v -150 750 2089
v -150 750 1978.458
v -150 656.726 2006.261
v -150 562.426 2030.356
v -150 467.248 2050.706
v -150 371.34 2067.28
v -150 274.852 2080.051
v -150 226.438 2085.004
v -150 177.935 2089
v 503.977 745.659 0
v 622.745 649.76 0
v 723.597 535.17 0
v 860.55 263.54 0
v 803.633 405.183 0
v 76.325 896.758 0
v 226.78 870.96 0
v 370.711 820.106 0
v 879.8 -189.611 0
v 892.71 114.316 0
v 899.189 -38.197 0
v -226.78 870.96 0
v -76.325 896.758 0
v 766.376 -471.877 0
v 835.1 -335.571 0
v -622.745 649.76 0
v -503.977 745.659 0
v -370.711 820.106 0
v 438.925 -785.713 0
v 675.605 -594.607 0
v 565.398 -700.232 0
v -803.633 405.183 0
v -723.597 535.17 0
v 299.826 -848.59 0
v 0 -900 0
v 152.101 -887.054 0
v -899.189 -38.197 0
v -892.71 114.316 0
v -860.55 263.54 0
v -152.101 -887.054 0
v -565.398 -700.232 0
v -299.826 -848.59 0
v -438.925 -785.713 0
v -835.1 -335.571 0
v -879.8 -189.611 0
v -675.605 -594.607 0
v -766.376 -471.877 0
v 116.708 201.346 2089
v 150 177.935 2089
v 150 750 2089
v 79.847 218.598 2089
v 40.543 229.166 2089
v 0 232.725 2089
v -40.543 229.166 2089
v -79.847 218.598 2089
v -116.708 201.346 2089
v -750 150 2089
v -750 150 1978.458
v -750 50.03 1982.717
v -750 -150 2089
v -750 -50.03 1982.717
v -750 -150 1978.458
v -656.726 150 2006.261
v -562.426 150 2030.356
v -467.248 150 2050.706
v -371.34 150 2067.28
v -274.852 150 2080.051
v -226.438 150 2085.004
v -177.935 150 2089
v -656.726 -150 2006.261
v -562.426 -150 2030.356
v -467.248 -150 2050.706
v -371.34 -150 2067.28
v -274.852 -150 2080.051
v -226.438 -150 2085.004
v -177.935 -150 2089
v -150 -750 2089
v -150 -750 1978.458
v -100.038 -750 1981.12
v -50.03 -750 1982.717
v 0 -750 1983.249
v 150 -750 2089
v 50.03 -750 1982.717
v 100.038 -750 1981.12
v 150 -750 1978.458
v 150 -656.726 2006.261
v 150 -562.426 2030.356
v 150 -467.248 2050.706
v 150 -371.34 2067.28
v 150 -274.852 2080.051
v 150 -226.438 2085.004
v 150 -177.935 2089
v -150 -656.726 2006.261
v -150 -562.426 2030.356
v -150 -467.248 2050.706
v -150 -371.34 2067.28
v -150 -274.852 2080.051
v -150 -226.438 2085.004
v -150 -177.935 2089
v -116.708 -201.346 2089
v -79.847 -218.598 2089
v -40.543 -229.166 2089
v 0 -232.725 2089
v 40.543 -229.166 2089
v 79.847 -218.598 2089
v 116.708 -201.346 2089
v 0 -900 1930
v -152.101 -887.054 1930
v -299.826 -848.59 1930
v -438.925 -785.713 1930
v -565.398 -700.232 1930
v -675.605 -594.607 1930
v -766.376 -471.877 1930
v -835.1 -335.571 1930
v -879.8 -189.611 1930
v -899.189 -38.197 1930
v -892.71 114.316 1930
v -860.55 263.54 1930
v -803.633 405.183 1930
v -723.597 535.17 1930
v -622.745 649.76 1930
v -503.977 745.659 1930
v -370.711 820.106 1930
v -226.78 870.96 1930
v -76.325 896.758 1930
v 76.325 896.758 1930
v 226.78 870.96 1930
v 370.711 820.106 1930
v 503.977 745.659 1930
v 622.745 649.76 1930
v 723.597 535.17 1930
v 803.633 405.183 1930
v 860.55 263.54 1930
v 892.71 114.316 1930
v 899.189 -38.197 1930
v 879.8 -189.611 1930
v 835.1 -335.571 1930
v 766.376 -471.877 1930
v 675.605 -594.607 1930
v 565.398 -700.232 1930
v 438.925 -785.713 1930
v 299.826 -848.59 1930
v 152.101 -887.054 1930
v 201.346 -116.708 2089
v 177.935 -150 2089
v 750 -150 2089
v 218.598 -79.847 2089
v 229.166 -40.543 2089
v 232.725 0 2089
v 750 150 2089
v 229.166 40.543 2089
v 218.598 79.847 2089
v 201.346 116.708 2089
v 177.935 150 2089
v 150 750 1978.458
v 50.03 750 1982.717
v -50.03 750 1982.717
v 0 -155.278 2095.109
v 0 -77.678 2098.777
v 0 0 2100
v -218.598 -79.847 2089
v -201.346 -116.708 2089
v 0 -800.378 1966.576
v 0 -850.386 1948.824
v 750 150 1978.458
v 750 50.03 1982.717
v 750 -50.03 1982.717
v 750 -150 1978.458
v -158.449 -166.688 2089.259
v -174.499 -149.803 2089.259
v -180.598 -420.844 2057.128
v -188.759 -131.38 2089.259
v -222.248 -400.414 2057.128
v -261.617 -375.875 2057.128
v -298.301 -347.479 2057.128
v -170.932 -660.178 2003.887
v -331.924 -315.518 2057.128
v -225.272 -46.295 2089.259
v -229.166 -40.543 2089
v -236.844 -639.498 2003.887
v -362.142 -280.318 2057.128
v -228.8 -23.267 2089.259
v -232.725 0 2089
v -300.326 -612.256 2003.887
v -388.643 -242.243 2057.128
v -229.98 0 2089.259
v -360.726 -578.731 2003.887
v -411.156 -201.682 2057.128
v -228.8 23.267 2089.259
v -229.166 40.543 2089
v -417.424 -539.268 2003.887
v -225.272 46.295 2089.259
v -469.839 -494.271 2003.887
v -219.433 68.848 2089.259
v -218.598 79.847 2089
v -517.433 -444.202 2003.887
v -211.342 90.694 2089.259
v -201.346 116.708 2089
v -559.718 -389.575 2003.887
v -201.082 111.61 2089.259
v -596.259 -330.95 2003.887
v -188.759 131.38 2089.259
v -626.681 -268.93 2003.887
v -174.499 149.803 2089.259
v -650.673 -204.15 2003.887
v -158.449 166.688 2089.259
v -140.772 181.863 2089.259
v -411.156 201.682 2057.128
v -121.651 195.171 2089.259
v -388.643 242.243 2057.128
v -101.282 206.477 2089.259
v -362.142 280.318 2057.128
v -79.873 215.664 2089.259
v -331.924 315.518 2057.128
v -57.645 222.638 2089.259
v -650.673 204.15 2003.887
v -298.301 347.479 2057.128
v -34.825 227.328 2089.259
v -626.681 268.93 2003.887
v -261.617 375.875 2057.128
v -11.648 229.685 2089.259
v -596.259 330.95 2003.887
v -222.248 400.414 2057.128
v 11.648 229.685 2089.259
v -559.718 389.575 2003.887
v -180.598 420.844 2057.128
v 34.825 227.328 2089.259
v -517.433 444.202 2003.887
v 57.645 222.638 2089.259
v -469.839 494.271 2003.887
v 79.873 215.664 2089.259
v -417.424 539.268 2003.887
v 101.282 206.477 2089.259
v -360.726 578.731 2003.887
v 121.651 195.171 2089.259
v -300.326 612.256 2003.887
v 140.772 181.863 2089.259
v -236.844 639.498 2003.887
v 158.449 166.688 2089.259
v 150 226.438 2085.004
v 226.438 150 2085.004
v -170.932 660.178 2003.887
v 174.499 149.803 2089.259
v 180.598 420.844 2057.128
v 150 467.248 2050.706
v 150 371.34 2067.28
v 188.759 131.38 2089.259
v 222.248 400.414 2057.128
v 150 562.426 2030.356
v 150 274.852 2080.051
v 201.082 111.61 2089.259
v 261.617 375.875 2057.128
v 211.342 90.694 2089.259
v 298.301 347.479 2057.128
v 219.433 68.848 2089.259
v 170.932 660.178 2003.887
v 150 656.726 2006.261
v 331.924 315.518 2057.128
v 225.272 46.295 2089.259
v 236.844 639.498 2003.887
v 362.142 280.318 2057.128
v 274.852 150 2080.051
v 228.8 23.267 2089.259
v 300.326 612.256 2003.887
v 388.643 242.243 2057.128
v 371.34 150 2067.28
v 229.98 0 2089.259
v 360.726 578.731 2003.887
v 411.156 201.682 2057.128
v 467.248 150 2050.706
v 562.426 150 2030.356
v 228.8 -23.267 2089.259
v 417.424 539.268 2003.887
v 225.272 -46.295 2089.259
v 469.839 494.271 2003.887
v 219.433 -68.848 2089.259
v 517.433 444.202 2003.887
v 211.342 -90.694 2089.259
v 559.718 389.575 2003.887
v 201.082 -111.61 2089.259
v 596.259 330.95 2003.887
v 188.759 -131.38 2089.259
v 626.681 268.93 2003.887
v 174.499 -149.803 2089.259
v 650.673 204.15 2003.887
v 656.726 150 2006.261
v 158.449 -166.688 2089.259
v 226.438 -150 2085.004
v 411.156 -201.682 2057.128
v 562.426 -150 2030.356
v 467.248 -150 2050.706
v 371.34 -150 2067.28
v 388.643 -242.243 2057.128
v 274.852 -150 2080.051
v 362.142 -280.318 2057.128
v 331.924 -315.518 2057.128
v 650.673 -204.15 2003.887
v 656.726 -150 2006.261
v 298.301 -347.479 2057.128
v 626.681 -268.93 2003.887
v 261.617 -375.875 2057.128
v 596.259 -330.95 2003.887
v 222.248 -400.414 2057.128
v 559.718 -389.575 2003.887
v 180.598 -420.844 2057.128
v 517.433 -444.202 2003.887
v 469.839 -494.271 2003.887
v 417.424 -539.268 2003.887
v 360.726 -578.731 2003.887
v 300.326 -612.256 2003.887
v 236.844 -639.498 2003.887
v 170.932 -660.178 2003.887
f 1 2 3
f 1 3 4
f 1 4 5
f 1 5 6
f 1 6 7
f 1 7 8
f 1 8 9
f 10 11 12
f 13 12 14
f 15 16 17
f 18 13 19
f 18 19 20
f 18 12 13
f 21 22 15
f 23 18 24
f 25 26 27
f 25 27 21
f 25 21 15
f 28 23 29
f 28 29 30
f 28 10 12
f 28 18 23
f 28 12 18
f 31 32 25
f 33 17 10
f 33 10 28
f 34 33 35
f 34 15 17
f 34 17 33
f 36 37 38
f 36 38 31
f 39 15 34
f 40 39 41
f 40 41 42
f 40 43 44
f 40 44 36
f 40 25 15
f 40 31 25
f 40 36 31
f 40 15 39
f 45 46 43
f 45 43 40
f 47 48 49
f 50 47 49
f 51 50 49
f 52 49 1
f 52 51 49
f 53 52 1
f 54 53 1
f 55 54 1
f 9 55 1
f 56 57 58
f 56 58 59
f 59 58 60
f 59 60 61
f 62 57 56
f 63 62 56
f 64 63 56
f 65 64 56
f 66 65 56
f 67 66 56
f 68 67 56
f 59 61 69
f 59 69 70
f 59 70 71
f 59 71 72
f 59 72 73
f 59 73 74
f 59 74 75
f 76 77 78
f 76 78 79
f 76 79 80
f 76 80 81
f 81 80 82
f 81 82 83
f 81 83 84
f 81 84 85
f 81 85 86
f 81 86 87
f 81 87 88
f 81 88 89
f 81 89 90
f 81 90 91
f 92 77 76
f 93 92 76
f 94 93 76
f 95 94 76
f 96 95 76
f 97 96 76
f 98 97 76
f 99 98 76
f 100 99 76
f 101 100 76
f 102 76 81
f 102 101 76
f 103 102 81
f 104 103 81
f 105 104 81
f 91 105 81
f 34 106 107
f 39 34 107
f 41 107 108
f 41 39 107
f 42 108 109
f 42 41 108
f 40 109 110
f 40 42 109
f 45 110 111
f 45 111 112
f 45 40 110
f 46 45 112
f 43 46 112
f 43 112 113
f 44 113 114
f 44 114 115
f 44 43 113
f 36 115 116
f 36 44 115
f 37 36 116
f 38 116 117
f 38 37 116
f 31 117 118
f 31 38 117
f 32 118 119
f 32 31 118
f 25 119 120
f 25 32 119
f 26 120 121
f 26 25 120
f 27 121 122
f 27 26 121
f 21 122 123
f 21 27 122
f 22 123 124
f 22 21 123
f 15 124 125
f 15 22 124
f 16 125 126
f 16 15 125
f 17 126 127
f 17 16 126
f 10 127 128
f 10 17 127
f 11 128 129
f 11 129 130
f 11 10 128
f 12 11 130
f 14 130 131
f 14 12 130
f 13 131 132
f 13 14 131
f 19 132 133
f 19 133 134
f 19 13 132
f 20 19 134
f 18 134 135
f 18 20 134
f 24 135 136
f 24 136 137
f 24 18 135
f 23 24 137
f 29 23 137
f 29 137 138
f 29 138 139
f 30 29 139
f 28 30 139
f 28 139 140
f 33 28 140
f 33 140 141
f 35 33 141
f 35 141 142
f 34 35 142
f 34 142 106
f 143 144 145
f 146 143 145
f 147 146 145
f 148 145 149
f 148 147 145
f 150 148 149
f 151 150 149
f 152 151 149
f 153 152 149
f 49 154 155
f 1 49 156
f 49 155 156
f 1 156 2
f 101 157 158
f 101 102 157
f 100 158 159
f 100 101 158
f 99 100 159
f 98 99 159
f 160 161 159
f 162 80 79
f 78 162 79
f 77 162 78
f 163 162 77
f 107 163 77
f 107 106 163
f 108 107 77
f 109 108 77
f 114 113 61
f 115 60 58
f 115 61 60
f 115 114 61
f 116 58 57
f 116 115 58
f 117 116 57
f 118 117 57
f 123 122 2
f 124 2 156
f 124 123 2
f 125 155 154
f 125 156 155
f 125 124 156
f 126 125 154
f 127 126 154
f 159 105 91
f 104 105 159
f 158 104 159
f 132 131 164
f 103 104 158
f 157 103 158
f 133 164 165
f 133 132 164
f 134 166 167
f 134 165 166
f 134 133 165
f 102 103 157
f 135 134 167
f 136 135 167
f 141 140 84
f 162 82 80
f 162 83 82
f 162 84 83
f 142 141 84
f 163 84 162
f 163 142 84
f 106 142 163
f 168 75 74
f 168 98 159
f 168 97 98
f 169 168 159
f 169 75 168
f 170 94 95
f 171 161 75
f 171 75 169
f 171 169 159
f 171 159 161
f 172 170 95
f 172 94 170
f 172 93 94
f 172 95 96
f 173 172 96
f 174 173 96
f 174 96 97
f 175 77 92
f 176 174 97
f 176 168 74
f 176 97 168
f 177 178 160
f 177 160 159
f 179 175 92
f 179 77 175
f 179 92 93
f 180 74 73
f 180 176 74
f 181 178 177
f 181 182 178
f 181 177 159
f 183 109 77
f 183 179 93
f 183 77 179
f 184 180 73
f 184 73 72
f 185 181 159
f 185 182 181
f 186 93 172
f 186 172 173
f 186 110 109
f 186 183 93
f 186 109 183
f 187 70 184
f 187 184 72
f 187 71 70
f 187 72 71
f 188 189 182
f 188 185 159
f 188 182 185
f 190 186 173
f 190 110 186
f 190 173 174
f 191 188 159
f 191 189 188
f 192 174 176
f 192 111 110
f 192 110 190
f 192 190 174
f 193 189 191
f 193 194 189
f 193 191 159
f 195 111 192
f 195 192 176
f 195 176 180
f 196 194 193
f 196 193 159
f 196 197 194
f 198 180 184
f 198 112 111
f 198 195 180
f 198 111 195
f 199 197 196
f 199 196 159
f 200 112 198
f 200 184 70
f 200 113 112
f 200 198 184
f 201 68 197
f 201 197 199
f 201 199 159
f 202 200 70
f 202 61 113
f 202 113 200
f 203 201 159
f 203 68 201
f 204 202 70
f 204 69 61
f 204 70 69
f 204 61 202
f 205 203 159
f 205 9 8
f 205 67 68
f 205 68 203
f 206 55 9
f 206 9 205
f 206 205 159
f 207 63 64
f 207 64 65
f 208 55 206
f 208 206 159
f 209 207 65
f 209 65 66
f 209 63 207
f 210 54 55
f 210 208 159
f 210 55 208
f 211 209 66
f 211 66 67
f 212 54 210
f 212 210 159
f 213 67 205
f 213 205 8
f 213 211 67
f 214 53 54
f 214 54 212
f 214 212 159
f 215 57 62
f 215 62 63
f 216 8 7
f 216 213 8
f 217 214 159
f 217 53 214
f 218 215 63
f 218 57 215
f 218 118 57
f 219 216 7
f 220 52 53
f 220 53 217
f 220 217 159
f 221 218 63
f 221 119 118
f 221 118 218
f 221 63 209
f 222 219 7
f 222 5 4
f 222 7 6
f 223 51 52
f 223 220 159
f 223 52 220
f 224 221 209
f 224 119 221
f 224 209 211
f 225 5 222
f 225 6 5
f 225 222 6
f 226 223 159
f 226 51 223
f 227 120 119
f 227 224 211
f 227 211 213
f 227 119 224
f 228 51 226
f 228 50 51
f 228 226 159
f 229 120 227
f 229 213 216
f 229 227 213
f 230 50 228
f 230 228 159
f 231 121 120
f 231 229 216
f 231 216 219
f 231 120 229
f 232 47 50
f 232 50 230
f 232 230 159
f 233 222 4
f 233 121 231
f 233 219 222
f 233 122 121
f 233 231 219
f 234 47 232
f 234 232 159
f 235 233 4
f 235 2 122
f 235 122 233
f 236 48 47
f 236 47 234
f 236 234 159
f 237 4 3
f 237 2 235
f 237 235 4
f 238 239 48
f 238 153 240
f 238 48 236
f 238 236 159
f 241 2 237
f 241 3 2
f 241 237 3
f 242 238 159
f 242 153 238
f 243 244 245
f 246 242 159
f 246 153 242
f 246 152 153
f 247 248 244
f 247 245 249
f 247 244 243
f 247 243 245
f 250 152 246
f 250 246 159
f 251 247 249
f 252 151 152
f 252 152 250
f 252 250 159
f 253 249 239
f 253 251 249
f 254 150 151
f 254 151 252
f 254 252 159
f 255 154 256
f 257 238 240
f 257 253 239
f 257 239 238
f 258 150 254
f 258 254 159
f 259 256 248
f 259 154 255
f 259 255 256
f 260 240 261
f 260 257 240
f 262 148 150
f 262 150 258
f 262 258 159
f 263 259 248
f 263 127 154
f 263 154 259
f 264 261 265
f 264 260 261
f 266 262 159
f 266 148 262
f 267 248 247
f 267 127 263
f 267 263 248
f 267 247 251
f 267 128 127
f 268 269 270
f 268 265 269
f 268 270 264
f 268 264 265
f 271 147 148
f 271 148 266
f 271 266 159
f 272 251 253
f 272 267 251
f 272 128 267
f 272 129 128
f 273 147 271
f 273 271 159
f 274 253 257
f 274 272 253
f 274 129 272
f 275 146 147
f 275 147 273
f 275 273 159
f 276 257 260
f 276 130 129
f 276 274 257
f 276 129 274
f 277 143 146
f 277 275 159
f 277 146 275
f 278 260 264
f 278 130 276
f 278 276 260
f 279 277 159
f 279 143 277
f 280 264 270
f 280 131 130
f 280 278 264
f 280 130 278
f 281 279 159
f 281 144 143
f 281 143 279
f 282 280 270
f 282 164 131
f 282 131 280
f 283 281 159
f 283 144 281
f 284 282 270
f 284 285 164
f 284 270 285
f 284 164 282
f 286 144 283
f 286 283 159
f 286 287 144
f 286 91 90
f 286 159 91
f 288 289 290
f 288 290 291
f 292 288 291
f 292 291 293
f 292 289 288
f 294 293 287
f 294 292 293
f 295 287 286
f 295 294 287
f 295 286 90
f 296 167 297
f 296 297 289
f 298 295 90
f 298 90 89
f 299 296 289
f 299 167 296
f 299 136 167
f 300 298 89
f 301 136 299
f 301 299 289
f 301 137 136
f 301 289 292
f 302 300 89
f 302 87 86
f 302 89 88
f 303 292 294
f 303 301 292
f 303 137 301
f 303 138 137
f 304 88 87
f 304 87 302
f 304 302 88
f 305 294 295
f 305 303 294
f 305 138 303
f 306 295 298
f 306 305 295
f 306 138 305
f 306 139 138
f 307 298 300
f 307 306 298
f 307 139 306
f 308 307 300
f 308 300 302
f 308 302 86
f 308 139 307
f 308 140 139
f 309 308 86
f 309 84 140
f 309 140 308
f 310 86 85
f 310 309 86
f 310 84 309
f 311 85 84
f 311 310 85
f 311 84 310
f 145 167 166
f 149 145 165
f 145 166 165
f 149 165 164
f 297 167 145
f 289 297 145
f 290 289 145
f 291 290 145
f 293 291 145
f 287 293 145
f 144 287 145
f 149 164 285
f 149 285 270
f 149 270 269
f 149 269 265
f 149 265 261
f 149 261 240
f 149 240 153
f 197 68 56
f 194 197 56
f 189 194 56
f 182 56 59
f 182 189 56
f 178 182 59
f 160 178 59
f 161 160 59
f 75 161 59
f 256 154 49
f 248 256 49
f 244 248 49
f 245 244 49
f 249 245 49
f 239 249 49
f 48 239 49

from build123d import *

# Parameters (mm, degrees)
F2_W     = 300
F2_H     = 750
F4_DEPTH = 159
F5_COUNT = 4


with BuildPart() as f3:
    # F1 (on Right) → F3 (revolve)
    with BuildSketch(Plane.YZ):
        with BuildLine():
            Line((-900, 0), (0, 0))
            Line((0, 0), (0, 2100))
            ThreePointArc((0, 2100), (-457.9574216016, 2057.1275261262), (-900, 1930))
            Line((-900, 1930), (-900, 0))
        make_face()
    revolve(axis=Axis((0, 0, 1050), (0, 0, -1)))



with BuildPart() as f4:
    # F2 (on offset) → F4 (new body)
    with BuildSketch(Plane.XY.offset(1930)):
        with Locations((0, -375)):
            Rectangle(F2_W, F2_H)
    extrude(amount=F4_DEPTH)


with BuildPart() as f3_1:
    add(f3.part)

    add(f4.part)  # F5 merges F4
    # F5: F4 ×4 about axis
    f5_axis = Axis((0, 0, 2582.4769020081), (0, 0, 1))
    for i in range(1, F5_COUNT):
        add(f4.part.rotate(f5_axis, i * 360 / F5_COUNT))


solid = f3_1.part
